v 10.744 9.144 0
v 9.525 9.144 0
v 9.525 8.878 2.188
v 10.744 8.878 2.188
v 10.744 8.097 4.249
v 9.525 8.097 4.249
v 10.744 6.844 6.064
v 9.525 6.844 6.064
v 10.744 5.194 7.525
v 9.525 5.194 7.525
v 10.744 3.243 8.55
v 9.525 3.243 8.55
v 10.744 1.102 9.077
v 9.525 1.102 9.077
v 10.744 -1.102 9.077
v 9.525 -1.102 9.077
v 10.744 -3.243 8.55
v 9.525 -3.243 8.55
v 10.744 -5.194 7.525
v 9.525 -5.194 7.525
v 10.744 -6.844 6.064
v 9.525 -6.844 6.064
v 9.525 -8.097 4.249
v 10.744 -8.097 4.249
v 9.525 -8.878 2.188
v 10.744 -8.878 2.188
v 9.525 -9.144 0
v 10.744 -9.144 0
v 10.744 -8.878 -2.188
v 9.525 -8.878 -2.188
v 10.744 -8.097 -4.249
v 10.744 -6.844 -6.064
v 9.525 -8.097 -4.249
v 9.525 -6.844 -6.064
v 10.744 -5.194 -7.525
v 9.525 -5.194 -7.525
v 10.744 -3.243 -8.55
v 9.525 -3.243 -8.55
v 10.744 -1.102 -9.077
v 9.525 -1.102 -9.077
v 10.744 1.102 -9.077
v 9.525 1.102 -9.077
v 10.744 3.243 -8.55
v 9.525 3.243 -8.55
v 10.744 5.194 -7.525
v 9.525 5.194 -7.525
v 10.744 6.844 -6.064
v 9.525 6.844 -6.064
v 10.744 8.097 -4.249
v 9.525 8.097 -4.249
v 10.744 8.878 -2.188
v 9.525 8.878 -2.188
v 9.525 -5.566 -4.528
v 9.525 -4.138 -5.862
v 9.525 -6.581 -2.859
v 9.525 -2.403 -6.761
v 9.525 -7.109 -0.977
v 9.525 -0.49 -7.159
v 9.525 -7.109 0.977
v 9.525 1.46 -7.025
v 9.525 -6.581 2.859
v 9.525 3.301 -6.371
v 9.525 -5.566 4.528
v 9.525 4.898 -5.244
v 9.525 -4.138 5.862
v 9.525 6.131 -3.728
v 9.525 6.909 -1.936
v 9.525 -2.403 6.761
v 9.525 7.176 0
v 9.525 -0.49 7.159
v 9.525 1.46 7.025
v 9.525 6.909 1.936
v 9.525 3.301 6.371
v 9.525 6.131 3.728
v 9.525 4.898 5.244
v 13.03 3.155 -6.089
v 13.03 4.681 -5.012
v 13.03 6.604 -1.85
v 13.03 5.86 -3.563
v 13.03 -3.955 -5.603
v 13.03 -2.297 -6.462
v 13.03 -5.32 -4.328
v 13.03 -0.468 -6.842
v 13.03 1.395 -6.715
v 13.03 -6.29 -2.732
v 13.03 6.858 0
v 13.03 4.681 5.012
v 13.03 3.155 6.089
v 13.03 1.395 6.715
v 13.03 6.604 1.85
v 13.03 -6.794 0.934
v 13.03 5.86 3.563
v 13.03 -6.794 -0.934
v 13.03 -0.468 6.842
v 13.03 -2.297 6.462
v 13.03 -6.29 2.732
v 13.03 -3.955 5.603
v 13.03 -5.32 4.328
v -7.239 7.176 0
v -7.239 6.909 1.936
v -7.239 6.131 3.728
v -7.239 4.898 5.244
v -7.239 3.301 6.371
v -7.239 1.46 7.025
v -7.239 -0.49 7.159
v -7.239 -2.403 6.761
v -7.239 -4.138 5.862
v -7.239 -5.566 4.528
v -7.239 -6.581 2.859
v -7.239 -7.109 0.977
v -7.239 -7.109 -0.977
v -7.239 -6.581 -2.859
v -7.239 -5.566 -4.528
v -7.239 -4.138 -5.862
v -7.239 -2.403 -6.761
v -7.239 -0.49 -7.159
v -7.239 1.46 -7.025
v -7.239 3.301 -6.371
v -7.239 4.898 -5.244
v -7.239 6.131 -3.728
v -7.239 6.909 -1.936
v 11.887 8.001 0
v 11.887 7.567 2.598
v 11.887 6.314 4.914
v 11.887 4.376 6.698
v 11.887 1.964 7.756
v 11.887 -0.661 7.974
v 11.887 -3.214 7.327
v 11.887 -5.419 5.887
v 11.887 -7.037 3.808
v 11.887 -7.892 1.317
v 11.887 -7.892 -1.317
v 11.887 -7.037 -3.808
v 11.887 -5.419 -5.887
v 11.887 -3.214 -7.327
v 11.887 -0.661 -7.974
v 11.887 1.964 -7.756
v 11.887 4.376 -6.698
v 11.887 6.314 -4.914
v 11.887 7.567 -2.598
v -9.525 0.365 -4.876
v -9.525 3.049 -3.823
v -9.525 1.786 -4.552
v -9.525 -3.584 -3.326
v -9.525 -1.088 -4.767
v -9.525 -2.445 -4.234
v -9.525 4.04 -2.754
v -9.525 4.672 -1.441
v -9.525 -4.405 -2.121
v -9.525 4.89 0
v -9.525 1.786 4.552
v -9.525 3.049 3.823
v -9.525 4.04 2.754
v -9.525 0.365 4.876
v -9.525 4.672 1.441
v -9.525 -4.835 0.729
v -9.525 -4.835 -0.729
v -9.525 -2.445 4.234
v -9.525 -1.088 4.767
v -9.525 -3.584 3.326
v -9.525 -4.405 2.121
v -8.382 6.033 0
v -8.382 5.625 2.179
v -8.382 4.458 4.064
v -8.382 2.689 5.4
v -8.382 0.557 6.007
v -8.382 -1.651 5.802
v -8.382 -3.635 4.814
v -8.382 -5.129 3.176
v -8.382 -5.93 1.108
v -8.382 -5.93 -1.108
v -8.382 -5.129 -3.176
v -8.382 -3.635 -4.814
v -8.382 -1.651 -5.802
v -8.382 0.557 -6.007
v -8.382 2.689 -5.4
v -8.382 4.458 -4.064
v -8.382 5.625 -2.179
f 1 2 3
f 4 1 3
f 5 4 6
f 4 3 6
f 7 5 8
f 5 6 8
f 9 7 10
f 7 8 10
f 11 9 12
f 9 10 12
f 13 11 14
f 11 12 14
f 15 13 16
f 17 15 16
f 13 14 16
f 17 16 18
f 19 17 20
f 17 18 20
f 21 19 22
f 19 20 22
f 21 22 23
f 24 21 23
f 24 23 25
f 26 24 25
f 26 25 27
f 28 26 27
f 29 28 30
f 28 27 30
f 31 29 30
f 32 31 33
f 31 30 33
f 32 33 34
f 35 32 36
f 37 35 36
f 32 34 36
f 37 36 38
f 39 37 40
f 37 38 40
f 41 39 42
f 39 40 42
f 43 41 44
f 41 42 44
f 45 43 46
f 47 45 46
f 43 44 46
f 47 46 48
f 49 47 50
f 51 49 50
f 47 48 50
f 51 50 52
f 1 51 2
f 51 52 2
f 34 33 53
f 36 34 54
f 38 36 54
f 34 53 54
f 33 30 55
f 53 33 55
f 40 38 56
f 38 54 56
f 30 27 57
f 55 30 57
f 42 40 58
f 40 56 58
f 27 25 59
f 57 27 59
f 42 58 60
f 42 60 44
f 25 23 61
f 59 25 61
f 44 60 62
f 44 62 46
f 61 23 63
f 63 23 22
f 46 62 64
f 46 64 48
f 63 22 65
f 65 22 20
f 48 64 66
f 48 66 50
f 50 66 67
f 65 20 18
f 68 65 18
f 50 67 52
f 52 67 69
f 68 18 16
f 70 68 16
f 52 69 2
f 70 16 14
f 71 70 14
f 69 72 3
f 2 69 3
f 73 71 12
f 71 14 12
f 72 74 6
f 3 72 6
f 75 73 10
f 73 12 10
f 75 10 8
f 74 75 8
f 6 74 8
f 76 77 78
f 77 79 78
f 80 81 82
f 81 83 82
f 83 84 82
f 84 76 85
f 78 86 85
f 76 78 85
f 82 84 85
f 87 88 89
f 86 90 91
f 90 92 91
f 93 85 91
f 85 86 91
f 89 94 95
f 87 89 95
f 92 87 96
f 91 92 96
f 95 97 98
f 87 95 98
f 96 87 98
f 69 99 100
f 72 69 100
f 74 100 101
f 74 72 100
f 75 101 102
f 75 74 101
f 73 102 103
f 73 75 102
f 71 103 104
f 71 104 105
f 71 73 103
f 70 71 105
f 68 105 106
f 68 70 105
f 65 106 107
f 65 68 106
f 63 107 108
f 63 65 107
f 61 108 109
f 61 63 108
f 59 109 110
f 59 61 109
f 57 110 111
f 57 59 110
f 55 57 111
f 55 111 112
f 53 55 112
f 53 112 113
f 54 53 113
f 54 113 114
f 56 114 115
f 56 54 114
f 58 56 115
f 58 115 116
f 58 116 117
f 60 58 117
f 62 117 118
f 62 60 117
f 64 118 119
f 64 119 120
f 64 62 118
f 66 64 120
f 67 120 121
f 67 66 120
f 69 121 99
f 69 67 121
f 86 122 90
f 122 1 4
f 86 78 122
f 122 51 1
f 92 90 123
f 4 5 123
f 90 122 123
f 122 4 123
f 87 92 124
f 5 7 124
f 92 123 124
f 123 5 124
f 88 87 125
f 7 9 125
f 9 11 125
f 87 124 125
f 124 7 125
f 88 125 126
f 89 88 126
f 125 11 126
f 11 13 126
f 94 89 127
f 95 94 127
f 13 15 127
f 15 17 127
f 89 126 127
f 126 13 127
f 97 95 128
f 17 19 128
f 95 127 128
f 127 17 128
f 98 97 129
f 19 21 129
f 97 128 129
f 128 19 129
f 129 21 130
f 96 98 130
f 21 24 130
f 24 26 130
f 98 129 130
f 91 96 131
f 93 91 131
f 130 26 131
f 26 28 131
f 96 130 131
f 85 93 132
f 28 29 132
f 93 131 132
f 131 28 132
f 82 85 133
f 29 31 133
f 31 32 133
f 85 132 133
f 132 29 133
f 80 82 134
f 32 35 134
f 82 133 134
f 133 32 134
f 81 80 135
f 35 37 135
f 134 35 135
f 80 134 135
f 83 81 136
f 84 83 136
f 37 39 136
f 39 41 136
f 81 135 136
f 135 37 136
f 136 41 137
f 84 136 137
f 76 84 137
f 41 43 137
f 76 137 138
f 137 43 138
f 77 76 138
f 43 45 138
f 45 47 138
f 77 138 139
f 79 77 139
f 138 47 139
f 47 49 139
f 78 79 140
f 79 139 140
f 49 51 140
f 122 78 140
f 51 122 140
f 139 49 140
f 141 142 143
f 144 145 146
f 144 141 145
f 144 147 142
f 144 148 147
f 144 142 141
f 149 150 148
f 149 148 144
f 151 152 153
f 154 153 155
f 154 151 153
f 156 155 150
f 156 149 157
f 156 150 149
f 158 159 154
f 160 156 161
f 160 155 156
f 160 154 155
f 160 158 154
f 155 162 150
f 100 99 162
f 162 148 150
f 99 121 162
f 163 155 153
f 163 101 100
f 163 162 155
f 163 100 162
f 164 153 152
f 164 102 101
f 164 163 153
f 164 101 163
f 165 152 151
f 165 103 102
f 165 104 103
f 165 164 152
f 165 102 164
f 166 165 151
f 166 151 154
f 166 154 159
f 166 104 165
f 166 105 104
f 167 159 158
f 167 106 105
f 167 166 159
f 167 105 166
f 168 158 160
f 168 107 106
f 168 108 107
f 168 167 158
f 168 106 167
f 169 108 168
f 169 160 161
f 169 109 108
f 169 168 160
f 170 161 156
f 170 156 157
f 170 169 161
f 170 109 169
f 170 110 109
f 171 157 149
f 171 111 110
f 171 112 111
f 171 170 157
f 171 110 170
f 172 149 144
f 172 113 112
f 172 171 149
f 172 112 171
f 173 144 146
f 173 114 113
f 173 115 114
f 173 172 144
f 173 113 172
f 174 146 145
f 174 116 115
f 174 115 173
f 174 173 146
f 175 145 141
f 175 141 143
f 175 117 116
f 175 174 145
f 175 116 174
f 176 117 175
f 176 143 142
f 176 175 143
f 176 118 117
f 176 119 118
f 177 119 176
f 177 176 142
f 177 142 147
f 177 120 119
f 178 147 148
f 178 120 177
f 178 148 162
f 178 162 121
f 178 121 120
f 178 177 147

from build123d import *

# Parameters (mm, degrees)
F0_W    = 19.05
F0_H    = 7.1755
F2_SIZE = 2.286


with BuildPart() as f1:
    # F0 (on Top) → F1 (revolve)
    with BuildSketch(Plane.XY):
        with Locations((0, 3.58775)):
            Rectangle(F0_W, F0_H)
        Polygon((9.525, 7.1755), (9.525, 0), (13.0302, 0), (13.0302, 9.144), (9.525, 9.144), align=None)
    revolve(axis=Axis((6.400125, 0, 0), (1, 0, 0)))

    # F2
    f2_edges = [f1.edges().sort_by_distance(p)[0] for p in [
        (13.0302, -9.144, 0),
        (-9.525, -7.1755, 0),
    ]]
    chamfer(f2_edges, length=F2_SIZE)


solid = f1.part
